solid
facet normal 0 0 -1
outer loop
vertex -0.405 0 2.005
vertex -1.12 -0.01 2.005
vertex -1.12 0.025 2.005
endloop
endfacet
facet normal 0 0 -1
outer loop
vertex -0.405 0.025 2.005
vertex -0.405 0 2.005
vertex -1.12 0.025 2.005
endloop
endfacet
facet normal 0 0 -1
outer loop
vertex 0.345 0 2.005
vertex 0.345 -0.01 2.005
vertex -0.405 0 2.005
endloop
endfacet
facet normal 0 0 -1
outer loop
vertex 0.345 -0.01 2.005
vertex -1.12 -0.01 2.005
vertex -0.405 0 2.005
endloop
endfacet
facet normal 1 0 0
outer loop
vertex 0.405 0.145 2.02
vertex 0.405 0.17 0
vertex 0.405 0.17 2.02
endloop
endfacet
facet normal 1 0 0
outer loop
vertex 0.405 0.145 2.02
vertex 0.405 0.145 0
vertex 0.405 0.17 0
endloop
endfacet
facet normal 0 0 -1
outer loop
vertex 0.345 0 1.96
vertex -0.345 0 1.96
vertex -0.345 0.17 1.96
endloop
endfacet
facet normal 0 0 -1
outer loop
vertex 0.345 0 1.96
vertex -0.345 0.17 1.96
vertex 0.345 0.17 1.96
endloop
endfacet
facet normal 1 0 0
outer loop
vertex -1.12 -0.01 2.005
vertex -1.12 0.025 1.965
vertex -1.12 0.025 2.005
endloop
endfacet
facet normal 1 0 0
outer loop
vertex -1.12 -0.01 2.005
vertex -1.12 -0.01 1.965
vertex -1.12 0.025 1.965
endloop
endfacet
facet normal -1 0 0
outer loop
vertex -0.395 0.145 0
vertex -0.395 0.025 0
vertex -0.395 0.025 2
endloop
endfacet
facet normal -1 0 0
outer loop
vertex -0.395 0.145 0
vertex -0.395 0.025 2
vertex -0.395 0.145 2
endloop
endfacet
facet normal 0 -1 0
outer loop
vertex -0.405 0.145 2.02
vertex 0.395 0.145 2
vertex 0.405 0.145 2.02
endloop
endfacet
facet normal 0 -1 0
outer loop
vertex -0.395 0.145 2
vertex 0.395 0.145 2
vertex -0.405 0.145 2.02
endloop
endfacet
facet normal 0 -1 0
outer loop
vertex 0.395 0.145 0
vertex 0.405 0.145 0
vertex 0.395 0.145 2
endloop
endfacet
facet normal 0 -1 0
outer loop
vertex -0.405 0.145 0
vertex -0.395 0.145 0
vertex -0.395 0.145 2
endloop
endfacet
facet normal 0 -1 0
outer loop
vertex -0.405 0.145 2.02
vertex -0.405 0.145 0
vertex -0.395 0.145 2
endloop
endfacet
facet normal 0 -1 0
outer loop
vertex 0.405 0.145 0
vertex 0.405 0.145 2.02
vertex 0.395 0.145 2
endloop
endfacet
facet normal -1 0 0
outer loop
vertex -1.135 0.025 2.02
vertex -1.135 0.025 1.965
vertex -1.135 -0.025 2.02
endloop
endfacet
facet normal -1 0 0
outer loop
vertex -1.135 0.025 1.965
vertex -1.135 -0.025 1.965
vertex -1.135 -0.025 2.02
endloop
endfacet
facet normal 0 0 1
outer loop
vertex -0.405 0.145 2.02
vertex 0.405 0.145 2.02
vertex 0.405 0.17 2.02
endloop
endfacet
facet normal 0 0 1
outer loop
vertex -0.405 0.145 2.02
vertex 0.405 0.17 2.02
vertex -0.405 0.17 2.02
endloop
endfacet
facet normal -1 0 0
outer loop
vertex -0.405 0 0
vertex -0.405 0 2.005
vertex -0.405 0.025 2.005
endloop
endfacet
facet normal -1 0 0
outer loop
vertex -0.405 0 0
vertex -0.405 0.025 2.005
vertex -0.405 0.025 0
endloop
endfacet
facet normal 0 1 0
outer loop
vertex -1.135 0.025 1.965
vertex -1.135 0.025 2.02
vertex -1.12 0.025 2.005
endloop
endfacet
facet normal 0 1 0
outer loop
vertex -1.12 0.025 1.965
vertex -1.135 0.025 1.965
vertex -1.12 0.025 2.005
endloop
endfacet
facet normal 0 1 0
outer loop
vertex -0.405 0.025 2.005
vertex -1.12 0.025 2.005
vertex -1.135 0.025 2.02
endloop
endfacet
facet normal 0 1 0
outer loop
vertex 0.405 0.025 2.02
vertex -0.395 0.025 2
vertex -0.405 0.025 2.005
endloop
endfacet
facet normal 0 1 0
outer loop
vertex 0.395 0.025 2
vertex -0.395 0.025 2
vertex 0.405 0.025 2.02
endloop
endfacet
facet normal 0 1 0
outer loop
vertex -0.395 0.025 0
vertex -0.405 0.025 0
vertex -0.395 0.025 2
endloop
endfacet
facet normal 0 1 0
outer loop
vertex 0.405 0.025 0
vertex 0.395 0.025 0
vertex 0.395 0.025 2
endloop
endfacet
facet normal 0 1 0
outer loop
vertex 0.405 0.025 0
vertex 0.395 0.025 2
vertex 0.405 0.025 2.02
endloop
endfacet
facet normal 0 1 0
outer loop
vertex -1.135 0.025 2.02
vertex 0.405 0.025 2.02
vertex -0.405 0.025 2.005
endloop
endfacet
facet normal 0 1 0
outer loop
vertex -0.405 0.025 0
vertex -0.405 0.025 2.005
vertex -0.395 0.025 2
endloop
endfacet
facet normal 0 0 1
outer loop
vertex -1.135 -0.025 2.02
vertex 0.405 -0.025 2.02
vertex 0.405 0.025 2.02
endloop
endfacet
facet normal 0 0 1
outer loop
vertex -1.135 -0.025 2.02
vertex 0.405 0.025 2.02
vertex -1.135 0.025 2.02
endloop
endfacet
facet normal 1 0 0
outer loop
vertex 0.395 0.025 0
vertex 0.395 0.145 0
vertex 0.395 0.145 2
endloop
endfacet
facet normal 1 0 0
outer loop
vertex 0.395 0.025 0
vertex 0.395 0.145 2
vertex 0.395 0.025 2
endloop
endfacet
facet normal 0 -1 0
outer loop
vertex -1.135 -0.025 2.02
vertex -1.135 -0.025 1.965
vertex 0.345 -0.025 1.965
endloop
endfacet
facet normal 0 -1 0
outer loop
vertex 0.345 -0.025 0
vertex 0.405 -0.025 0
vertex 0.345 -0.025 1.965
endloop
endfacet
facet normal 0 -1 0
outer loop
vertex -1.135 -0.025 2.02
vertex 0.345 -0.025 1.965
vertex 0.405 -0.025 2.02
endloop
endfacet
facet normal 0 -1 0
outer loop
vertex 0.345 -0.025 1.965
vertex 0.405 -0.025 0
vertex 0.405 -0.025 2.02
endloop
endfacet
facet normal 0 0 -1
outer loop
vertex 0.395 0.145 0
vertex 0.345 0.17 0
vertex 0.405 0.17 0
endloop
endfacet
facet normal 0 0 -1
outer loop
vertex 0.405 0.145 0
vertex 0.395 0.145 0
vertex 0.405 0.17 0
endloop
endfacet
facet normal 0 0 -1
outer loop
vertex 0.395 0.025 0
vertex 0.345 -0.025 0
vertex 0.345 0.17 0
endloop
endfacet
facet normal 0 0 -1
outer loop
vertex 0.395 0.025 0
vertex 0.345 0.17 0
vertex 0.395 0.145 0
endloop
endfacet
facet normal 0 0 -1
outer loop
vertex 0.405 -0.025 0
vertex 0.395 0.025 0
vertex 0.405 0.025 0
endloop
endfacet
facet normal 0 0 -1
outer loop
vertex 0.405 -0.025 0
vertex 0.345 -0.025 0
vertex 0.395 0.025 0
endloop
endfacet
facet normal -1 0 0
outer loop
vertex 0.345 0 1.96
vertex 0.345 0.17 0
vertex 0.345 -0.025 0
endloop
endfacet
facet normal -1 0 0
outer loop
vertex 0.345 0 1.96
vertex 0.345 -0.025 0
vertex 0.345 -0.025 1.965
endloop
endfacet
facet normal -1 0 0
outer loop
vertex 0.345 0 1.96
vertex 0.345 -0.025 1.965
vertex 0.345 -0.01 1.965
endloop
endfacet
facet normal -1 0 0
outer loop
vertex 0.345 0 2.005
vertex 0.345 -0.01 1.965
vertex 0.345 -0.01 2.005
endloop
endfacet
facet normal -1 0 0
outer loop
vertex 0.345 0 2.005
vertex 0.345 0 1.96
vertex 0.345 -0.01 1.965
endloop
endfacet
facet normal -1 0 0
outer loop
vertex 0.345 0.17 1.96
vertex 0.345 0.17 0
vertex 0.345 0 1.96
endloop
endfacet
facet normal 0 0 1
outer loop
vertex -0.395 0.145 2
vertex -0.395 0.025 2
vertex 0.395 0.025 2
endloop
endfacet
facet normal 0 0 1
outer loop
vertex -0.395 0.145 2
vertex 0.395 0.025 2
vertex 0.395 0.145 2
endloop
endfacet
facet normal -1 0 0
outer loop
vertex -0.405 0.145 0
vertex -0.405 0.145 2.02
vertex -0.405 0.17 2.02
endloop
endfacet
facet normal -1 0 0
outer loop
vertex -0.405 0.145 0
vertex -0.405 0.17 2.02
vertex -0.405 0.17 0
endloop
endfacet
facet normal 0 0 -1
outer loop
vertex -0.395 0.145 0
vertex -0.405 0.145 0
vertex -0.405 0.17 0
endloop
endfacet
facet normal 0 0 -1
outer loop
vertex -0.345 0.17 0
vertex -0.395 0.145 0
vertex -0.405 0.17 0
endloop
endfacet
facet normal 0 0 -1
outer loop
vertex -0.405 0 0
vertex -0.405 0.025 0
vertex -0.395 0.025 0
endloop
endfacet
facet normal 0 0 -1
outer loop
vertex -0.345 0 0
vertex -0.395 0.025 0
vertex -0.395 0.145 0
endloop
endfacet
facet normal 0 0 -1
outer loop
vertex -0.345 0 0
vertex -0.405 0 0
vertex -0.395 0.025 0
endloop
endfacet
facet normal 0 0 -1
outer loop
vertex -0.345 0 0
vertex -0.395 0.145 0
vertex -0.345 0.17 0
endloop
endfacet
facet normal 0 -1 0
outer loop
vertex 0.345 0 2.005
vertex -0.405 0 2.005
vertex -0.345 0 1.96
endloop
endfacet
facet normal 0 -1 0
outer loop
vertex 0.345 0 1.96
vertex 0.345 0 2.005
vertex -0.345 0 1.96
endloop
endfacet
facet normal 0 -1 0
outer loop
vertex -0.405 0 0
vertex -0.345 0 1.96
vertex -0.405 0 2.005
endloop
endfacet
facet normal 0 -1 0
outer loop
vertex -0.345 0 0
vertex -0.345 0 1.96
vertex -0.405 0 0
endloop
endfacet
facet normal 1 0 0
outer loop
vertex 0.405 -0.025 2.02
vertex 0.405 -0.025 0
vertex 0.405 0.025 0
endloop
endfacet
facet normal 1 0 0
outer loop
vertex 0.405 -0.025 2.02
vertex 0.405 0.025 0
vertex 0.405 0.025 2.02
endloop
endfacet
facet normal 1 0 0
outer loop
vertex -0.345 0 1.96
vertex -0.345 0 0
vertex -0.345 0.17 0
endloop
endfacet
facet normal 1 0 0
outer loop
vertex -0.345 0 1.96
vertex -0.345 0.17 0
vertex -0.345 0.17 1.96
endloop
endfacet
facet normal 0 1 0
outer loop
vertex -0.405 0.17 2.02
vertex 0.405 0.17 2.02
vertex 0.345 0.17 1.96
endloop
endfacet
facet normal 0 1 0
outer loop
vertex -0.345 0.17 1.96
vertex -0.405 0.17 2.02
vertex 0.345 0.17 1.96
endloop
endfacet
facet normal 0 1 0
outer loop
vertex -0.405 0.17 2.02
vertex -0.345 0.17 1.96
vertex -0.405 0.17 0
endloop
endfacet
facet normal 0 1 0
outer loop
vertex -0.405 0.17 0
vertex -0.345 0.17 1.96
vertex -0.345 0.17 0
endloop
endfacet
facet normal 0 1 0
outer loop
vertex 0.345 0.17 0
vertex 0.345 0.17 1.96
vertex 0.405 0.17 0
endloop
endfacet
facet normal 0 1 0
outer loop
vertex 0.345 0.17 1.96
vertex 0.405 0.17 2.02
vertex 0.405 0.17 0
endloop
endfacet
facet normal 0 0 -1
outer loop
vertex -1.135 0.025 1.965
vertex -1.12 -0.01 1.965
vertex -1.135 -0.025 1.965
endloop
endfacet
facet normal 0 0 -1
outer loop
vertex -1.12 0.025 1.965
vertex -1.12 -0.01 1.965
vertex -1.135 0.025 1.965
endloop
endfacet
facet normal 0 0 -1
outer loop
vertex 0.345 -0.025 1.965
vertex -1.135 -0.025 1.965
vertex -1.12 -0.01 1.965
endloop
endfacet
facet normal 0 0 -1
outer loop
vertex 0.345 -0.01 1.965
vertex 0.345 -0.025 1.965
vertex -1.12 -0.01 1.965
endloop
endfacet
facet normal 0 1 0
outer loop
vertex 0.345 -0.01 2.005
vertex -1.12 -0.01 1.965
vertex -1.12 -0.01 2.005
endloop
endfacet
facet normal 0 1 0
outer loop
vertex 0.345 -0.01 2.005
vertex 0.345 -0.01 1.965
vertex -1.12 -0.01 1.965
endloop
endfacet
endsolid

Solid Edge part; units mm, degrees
sketch "Sketch1" plane through (0, 0, 0) normal (0, -1, 0) x (1, 0, 0)
  line L0 (-0.405, 0) -> (0.405, 0)
  line L1 (0.405, 0) -> (0.405, 2.02)
  line L2 (0.405, 2.02) -> (-0.405, 2.02)
  line L3 (-0.405, 2.02) -> (-0.405, 0)
  dimension "D1" = 2.02
  dimension "D2" = 0.81
extrude "Protrusion1" add sketch "Sketch1" against normal blind 0.17
sketch "Sketch2" plane through (0, 0.085, 0) normal (0, 0, -1) x (1, 0, 0)
  line L0 (-0.405, -0.06) -> (-0.405, 0.06)
  line L1 (-0.405, 0.06) -> (-0.395, 0.06)
  line L2 (-0.395, 0.06) -> (-0.395, -0.06)
  line L3 (-0.395, -0.06) -> (-0.405, -0.06)
  dimension "D1" = 0.12
  dimension "D2" = 0.01
extrude "Cutout1" cut sketch "Sketch2" against normal through all
mirror "Mirror1" about plane through (0, 0, 0) normal (1, 0, 0) of "Cutout1"
sketch "Sketch3" plane through (0, 0, 0) normal (1, 0, 0) x (0, 1, 0)
  line L0 (0.025, 2.02) -> (0.025, 2)
  line L1 (0.025, 2) -> (0.145, 2)
  line L2 (0.145, 2.02) -> (0.145, 2)
  line L3 (0.145, 2.02) -> (0.025, 2.02)
  dimension "D1" = 0.02
extrude "Cutout3" cut sketch "Sketch3" along normal through all and the other way through all
sketch "Sketch4" plane through (0, 0, 1.01) normal (0, -1, 0) x (1, 0, 0)
  line L0 (-0.345, -1.01) -> (0.345, -1.01)
  line L1 (0.345, 0.95) -> (0.345, -1.01)
  line L2 (-0.345, 0.95) -> (0.345, 0.95)
  line L3 (-0.345, -1.01) -> (-0.345, 0.95)
  dimension "D1" = 0.69
  dimension "D2" = 1.96
extrude "Cutout4" cut sketch "Sketch4" against normal through all
sketch "Sketch5" plane through (0.405, 0.0125, 1.01) normal (1, 0, 0) x (0, 0, -1)
  line L0 (-1.01, 0.0125) -> (-1.01, -0.0375)
  line L1 (-1.01, -0.0375) -> (-0.955, -0.0375)
  line L2 (-0.955, -0.0375) -> (-0.955, -0.0225)
  line L3 (-0.955, -0.0225) -> (-0.995, -0.0225)
  line L4 (-0.995, -0.0225) -> (-0.995, 0.0125)
  line L5 (-1.01, 0.0125) -> (-0.995, 0.0125)
  dimension "D1" = 0.015
  dimension "D2" = 0.055
  dimension "D3" = 0.05
extrude "Protrusion2" add sketch "Sketch5" against normal blind 1.54
sketch "Sketch6" plane through (0.405, 0, 1.01) normal (1, 0, 0) x (0, 0, -1)
  line L0 (-1.01, 0.025) -> (-1.01, -0.025)
  line L1 (-1.01, -0.025) -> (-0.955, -0.025)
  line L2 (-0.955, -0.025) -> (-0.955, 0.025)
  line L3 (-0.955, 0.025) -> (-1.01, 0.025)
extrude "Ausprägung_3" add sketch "Sketch6" against normal blind 0.015
sketch "Sketch7" plane through (-1.135, 0, 1.9925) normal (-1, 0, 0) x (0, -1, 0)
  line L0 (-0.025, 0.0275) -> (0.025, 0.0275)
  line L1 (0.025, 0.0275) -> (0.025, -0.0275)
  line L2 (0.025, -0.0275) -> (-0.025, -0.0275)
  line L3 (-0.025, -0.0275) -> (-0.025, 0.0275)
extrude "Ausprägung_4" add sketch "Sketch7" against normal blind 0.015
sketch "Sketch8" plane through (0, 0, 1.0025) normal (0, -1, 0) x (1, 0, 0)
  line L0 (0.405, 1.0175) -> (0.405, -1.0025)
  line L1 (0.405, -1.0025) -> (0.345, -1.0025)
  line L2 (0.345, -1.0025) -> (0.345, 1.0175)
  line L3 (0.345, 1.0175) -> (0.405, 1.0175)
extrude "Protrusion3" add sketch "Sketch8" along normal up to surface (0.025 mm away)
